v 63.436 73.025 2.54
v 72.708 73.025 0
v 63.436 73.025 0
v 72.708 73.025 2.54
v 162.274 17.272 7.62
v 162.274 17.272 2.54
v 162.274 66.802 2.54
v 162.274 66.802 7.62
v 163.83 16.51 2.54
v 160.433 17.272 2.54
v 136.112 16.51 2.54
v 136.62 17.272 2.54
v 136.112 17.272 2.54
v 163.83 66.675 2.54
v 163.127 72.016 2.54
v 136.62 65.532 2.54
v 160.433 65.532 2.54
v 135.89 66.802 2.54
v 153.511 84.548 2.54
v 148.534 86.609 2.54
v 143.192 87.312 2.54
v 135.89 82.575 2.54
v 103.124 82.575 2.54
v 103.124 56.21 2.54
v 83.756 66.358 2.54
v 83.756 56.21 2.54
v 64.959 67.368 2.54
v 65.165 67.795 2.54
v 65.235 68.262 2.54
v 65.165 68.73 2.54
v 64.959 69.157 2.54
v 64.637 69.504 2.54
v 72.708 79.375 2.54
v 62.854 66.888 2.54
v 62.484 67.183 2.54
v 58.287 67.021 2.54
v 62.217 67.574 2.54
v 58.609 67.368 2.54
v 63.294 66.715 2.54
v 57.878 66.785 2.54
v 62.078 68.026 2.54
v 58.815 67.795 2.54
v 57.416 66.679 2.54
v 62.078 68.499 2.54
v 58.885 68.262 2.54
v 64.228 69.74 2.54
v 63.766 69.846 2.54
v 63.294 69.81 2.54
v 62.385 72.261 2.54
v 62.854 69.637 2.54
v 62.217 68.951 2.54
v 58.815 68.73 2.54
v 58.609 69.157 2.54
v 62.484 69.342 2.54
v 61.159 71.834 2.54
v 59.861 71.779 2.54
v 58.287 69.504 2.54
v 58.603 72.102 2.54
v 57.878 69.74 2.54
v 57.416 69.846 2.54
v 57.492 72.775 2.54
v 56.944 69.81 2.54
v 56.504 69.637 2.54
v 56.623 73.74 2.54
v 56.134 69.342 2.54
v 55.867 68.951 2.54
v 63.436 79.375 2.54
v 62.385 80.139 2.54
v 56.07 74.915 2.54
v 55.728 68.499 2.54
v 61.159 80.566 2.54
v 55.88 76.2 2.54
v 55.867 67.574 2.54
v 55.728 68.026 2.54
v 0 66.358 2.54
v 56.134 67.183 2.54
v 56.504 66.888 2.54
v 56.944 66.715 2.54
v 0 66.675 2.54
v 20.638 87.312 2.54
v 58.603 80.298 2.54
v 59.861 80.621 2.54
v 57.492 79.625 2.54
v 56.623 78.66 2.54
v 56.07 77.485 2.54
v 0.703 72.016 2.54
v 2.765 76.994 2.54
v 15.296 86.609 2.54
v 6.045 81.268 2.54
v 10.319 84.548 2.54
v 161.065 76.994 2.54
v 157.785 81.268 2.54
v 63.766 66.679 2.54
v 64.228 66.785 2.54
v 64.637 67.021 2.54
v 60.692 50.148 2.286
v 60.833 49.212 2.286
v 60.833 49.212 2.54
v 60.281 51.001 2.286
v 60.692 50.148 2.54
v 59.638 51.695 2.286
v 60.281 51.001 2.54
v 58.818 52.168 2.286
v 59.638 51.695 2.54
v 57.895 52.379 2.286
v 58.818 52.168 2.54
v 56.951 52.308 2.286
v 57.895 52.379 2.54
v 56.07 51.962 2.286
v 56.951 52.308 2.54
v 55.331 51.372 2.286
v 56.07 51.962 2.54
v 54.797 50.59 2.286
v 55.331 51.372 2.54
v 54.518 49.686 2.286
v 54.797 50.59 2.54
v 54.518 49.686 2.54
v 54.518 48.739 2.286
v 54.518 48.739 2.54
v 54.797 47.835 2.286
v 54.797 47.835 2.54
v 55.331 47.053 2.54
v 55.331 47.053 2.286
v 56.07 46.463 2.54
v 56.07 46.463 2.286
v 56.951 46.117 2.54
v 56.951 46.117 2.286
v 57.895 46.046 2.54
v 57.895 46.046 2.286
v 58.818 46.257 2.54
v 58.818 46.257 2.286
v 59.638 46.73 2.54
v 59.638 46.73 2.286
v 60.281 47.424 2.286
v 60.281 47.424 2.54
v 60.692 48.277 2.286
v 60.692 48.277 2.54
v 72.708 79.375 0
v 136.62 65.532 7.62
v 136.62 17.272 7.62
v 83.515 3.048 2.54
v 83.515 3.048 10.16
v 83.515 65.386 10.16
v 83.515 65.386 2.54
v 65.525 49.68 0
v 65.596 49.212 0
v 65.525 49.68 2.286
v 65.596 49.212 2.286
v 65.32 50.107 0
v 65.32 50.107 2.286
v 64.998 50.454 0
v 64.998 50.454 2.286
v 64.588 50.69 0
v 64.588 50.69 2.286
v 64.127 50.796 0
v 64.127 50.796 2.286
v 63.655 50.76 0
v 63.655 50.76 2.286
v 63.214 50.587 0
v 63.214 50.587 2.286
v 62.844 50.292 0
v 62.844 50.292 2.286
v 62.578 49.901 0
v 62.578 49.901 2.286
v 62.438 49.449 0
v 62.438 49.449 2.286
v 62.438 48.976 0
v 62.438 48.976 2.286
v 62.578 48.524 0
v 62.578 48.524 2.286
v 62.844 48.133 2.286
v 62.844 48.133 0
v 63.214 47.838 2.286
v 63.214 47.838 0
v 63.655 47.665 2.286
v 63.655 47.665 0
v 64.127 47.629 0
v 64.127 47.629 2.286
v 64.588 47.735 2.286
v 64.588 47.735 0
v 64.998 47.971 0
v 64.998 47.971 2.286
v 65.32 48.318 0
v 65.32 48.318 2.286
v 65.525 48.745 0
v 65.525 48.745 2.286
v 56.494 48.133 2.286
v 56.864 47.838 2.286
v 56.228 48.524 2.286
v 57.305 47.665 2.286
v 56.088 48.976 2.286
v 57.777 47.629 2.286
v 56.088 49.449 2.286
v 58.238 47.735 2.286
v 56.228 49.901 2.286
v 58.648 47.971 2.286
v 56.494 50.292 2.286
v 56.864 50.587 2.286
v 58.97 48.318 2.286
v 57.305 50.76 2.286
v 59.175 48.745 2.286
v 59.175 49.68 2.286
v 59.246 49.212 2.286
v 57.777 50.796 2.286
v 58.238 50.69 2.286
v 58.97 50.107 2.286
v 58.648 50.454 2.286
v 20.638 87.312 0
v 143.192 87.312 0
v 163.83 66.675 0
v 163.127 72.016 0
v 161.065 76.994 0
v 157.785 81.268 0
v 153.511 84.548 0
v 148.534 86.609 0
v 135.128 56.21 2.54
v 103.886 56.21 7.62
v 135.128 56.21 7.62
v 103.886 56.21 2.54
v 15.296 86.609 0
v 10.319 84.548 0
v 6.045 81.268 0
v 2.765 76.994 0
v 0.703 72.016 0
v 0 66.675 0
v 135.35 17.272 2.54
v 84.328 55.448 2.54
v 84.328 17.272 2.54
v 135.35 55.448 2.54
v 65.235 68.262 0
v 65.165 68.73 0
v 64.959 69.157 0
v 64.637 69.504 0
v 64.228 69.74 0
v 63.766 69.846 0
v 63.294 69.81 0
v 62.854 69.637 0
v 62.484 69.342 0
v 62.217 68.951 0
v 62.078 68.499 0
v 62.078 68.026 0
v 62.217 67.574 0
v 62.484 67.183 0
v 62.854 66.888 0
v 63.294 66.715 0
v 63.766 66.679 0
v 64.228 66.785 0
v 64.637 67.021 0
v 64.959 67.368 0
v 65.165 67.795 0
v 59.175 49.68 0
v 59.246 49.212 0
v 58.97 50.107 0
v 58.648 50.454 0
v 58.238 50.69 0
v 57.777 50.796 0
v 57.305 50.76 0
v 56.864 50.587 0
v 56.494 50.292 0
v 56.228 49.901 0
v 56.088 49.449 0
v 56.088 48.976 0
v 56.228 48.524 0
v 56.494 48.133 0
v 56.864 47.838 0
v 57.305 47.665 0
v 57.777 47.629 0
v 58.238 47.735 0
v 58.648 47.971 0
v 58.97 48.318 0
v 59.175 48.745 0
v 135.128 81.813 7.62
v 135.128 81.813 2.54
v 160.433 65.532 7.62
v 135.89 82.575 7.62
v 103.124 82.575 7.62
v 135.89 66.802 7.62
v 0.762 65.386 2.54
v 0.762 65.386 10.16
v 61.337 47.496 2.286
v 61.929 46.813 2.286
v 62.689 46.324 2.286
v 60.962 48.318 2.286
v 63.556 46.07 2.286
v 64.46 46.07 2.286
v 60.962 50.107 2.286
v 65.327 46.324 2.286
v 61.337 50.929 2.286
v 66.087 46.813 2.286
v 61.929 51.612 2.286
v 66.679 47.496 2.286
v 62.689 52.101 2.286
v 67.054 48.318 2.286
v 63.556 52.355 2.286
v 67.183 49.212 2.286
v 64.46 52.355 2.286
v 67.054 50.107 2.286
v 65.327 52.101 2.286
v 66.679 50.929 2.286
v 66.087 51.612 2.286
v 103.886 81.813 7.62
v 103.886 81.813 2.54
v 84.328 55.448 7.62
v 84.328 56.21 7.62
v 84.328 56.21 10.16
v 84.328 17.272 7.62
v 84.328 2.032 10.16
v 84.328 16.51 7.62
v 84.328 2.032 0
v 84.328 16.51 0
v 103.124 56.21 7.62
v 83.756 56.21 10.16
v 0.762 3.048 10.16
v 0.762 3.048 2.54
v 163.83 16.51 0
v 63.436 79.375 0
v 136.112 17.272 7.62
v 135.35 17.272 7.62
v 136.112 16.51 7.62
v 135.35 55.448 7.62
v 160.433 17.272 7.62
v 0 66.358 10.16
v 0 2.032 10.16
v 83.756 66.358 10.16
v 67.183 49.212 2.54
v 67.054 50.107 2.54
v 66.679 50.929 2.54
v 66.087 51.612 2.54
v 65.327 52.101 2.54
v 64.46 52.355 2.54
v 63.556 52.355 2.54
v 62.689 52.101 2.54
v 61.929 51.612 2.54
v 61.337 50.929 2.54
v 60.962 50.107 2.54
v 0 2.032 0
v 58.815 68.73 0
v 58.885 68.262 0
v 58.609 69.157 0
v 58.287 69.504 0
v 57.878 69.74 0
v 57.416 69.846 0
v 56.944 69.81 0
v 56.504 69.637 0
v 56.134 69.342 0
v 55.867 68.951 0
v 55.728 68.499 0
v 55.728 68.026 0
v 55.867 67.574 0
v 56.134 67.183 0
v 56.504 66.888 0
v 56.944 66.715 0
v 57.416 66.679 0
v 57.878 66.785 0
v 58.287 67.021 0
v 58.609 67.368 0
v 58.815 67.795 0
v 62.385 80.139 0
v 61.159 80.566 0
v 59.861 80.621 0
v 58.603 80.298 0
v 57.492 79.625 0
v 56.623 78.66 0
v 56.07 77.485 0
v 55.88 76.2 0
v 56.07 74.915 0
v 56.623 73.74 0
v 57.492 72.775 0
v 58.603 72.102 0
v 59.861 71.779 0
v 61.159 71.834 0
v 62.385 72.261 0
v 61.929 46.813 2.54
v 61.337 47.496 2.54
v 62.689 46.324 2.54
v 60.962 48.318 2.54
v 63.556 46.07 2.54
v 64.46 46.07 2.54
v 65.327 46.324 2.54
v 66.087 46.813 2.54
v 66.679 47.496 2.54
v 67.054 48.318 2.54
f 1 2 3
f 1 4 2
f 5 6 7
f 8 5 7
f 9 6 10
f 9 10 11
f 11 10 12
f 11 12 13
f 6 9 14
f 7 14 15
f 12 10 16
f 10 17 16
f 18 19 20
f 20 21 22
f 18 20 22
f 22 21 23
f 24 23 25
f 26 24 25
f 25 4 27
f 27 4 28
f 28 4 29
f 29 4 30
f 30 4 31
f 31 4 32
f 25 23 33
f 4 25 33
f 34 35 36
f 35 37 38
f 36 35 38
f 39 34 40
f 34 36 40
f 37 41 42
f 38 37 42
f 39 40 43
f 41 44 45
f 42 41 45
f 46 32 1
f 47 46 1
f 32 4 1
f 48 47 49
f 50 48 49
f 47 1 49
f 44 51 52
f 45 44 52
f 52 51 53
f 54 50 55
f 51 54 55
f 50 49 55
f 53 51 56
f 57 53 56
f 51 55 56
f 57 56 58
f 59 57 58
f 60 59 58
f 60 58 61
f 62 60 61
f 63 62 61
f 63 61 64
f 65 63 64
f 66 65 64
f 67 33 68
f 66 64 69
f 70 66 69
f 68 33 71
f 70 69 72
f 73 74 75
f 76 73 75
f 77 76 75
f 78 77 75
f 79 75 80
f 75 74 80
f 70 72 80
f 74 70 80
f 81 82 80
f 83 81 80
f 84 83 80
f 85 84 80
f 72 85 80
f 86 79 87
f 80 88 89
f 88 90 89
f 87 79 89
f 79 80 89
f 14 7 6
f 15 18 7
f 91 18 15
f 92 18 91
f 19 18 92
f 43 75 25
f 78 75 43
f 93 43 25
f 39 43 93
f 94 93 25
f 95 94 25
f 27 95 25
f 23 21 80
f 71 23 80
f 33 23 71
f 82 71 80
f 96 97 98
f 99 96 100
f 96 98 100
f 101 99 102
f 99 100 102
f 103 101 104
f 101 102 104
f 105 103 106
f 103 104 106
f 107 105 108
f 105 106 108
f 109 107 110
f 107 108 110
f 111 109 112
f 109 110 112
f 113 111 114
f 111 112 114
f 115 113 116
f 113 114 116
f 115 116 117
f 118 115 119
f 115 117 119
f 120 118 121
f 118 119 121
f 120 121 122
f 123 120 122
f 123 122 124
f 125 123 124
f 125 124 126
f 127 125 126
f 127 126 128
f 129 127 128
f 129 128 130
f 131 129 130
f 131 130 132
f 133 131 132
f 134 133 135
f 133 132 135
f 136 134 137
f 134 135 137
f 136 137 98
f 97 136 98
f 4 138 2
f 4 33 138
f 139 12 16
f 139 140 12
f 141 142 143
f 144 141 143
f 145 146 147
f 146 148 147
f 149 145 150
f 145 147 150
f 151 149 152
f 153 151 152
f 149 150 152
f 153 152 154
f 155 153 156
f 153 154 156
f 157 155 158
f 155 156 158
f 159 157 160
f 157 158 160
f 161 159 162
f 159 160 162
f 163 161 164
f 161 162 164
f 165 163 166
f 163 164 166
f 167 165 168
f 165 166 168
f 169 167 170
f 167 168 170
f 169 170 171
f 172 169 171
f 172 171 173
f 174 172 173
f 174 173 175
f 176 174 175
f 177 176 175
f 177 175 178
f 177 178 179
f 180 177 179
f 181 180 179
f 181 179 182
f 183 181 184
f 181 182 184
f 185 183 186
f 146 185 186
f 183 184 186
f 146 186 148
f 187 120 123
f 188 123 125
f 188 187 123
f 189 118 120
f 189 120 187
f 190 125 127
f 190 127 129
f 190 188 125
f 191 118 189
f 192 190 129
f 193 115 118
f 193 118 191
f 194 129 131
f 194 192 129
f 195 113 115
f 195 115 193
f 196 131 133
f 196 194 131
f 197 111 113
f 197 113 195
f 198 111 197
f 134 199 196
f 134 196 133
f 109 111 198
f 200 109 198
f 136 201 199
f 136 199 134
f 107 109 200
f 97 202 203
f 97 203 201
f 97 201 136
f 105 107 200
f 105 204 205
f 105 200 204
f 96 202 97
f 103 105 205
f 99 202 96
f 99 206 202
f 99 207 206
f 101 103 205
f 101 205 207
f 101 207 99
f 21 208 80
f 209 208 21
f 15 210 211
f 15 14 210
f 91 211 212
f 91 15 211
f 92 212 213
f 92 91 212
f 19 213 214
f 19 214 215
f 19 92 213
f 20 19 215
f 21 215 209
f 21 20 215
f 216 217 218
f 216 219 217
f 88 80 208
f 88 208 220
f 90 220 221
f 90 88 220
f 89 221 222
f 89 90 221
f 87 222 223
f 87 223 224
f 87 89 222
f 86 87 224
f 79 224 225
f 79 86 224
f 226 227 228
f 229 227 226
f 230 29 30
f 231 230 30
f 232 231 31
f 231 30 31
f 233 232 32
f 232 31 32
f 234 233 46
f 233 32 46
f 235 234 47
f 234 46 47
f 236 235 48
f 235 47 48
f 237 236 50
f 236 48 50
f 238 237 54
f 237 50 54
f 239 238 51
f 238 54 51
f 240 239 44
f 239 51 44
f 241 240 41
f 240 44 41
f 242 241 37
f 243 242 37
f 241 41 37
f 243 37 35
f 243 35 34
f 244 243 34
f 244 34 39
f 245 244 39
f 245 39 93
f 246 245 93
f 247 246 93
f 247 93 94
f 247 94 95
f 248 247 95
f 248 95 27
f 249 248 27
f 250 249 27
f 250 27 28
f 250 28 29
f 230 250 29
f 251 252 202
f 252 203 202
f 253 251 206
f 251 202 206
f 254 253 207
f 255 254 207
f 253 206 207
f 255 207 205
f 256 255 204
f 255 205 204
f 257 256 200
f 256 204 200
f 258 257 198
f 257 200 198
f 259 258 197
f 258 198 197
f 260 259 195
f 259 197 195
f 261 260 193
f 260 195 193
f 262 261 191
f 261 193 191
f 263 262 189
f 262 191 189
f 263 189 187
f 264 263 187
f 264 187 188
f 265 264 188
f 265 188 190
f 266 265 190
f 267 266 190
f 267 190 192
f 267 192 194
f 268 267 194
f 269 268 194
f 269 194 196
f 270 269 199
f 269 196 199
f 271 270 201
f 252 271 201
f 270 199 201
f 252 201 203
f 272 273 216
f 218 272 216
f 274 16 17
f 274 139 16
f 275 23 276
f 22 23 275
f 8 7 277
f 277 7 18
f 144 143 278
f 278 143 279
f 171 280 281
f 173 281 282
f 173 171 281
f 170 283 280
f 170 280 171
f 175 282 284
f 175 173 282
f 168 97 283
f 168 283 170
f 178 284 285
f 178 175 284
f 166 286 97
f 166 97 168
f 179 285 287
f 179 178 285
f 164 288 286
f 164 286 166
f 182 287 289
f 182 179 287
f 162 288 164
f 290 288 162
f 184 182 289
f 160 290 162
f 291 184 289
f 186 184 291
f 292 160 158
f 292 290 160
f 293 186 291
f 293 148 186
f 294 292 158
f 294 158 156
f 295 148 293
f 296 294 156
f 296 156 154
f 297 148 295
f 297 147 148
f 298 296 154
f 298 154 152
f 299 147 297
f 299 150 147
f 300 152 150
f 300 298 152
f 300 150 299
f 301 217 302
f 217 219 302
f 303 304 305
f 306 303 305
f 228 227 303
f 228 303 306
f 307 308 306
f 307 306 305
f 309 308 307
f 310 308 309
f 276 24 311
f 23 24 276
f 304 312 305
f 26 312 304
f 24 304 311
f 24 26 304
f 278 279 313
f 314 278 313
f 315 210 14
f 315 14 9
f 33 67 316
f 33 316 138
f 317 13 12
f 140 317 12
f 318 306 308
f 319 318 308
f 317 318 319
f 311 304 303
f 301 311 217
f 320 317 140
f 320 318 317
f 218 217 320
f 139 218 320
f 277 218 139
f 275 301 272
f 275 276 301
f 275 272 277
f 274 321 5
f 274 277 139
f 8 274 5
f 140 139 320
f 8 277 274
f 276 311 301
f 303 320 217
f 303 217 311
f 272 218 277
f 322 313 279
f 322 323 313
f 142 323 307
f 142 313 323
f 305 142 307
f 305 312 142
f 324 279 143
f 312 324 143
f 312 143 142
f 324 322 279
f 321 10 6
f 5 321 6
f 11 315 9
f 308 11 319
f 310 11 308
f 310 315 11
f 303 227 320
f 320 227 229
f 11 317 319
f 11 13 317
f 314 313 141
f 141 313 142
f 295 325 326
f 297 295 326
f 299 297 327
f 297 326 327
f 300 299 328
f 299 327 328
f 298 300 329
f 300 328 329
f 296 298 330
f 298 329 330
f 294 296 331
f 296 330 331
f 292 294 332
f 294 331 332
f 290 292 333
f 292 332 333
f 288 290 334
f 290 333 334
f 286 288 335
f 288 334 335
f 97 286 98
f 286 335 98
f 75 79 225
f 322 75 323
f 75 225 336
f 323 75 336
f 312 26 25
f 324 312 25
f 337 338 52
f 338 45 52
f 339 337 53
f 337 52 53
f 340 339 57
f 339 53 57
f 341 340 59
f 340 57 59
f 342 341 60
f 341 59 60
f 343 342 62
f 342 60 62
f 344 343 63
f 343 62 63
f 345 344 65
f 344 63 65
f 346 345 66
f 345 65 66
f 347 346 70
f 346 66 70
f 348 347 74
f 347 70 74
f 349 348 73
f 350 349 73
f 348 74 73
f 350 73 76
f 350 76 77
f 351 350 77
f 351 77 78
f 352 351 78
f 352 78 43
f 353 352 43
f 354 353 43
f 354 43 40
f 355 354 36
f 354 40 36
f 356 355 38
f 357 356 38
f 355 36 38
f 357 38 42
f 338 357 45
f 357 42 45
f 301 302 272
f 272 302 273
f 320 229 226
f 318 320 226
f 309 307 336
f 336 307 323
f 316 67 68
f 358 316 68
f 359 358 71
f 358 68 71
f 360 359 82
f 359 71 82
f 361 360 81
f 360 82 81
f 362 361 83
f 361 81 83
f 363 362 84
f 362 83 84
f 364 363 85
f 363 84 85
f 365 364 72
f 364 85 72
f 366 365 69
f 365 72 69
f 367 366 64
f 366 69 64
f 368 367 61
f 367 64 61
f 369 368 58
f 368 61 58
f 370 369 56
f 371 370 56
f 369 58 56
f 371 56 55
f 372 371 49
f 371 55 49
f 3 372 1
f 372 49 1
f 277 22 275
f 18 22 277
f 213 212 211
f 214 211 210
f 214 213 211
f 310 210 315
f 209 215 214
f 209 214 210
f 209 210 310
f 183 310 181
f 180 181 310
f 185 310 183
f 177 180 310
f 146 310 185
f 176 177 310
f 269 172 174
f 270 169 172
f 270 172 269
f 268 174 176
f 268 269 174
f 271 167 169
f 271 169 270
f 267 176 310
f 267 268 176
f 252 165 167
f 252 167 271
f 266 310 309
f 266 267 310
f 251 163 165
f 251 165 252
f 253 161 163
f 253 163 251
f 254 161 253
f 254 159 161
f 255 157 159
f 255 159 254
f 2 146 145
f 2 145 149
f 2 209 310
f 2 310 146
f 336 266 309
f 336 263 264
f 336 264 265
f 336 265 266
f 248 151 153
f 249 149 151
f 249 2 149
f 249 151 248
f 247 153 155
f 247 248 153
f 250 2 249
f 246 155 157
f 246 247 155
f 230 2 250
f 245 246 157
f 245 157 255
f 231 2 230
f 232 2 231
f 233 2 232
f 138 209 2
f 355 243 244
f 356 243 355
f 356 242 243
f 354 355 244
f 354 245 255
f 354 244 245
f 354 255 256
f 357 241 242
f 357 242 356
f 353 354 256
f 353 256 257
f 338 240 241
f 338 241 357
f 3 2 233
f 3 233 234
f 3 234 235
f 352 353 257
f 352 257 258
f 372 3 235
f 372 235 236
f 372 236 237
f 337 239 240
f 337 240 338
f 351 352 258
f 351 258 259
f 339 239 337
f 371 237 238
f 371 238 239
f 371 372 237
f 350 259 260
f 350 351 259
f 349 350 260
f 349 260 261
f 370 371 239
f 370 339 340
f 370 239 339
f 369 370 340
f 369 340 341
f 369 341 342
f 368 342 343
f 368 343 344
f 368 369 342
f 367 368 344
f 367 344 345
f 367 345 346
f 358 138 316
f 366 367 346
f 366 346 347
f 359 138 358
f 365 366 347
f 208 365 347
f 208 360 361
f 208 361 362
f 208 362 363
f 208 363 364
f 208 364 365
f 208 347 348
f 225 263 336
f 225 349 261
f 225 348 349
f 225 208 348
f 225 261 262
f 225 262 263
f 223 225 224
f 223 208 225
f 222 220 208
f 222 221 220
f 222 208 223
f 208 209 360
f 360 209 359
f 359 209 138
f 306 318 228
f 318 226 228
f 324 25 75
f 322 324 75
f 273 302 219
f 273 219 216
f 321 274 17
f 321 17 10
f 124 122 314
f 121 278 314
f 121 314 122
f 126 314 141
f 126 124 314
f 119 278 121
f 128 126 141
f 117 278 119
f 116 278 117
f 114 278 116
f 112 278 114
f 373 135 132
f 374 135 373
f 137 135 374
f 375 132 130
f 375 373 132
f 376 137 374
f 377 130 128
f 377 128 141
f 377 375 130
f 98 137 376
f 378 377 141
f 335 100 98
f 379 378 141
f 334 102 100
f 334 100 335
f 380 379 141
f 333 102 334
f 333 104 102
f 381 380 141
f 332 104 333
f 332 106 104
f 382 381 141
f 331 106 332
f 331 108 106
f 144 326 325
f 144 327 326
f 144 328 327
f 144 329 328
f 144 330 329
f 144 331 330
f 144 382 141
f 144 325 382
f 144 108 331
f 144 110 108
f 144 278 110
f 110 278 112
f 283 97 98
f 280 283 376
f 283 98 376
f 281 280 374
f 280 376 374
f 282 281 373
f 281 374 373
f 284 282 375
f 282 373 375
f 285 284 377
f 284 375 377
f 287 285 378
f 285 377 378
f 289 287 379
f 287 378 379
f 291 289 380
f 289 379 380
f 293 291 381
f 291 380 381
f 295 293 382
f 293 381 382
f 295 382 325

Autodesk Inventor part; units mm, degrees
sketch "Sketch1" plane through (0, 0, 0) normal (0, 0, 1) x (1, 0, 0)
  line L0 (0, 87.3125) -> (163.83, 87.3125)
  line L1 (163.83, 87.3125) -> (163.83, 0)
  line L2 (163.83, 0) -> (0, 0)
  line L3 (0, 0) -> (0, 87.3125)
  dimension "d0" = 163.83
  dimension "d1" = 87.3125
extrude "Extrusion1" add sketch "Sketch1" along normal blind 2.54
sketch "Sketch2" plane through (0, 0, 2.54) normal (0, 0, 1) x (1, 0, 0)
  point P0 (0, 0)
fillet "Fillet1" radius 20.6375 1 edges at (163.83, 87.3125, 1.27)
fillet "Fillet2" radius 20.6375 1 edges at (0, 87.3125, 1.27)
sketch "Sketch8" plane through (0, 0, 2.54) normal (0, 0, 1) x (1, 0, 0)
  point P0 (0, 0)
sketch "Sketch11" plane through (0, 0, 2.54) normal (0, 0, 1) x (1, 0, 0)
  point P0 (0, 0)
sketch "Sketch15" plane through (0, 0, 2.54) normal (0, 0, 1) x (1, 0, 0)
  line L0 (83.566, 56.2102) -> (136.1122, 56.2102)
  line L1 (136.1122, 56.2102) -> (136.1122, 16.51)
  line L2 (136.1122, 16.51) -> (83.566, 16.51)
  line L3 (83.566, 16.51) -> (83.566, 56.2102)
  line L4 (0, 0) -> (163.83, 0) projected
  line L5 (163.83, 0) -> (163.83, 66.675) projected
  dimension "d136" = 52.5463
  dimension "d137" = 16.51
  dimension "d151" = 39.7002
  dimension "d184" = 27.7177
extrude "Extrusion6" add sketch "Sketch15" along normal blind 5.08
shell "Shell5" thickness 0.762 removed faces 1 at (101.0814, 42.9768, 7.62)
sketch "Sketch16" plane through (0, 0, 2.54) normal (0, 0, 1) x (1, 0, 0)
  line L0 (103.124, 82.5754) -> (135.89, 82.5754)
  line L1 (135.89, 82.5754) -> (135.89, 56.2102)
  line L2 (135.89, 56.2102) -> (103.124, 56.2102)
  line L3 (103.124, 56.2102) -> (103.124, 82.5754)
  arc A0 (163.83, 66.675) -> (143.1925, 87.3125) centre (143.1925, 66.675) ccw projected
  line L4 (136.1122, 56.2102) -> (83.566, 56.2102) projected
  point P0 (0, 0)
  dimension "d62" = 32.766
  dimension "d63" = 26.3652
  dimension "d183" = 27.94
  dimension "d231" = 0
extrude "Extrusion7" add sketch "Sketch16" along normal blind 5.08
shell "Shell6" thickness 0.762 removed faces 1 at (124.968, 73.787, 7.62)
sketch "Sketch20" plane through (0, 0, 2.54) normal (0, 0, 1) x (1, 0, 0)
  circle A0 centre (60.325, 76.2) radius 4.445
  line L0 (0, 66.675) -> (0, 0) projected
  line L1 (103.124, 87.3125) -> (20.6375, 87.3125) projected
  point P0 (103.124, 82.5754)
  point P1 (20.6375, 87.3125)
  dimension "d77" = 8.89
  dimension "d138" = 60.325
  dimension "d150" = 11.1125
sketch "Sketch24" plane through (0, 0, 2.54) normal (0, 0, 1) x (1, 0, 0)
  line L0 (0, 0) -> (83.7565, 0)
  line L1 (83.7565, 0) -> (83.7565, 66.3575)
  line L2 (83.7565, 66.3575) -> (0, 66.3575)
  line L3 (0, 66.3575) -> (0, 0)
  line L4 (103.124, 87.3125) -> (20.6375, 87.3125) projected
  point P0 (103.124, 82.5754)
  point P1 (20.6375, 87.3125)
  dimension "d114" = 83.7565
  dimension "d210" = 20.955
extrude "Extrusion13" add sketch "Sketch24" along normal blind 7.62
sketch "Sketch25" plane through (0, 0, 2.54) normal (0, 0, 1) x (1, 0, 0)
  circle A0 centre (57.2977, 68.2625) radius 1.5875
  line L0 (0, 66.675) -> (0, 66.3575) projected
  circle A1 centre (63.6477, 68.2625) radius 1.5875
  line L1 (103.124, 87.3125) -> (20.6375, 87.3125) projected
  point P0 (0, 0)
  point P1 (103.124, 82.5754)
  point P2 (20.6375, 87.3125)
  dimension "d126" = 3.175
  dimension "d139" = 57.2977
  dimension "d141" = 6.35
  dimension "d149" = 19.05
sketch "Sketch27" plane through (0, 0, 2.54) normal (0, 0, 1) x (1, 0, 0)
  line L0 (62.5475, 79.375) -> (72.7075, 79.375)
  line L1 (72.7075, 79.375) -> (72.7075, 73.025)
  line L2 (72.7075, 73.025) -> (62.5475, 73.025)
  line L3 (62.5475, 73.025) -> (62.5475, 79.375)
  arc A0 (20.6375, 87.3125) -> (0, 66.675) centre (20.6375, 66.675) ccw projected
  point P0 (0, 0)
  dimension "d181" = 41.91
  dimension "d182" = 10.16
ref_plane "Work Plane1" through (0.508, 0.508, 2.286) normal (0, 0, 1) x (1, 0, 0)
sketch "Sketch28" plane through (0.508, 0.508, 2.286) normal (0, 0, 1) x (1, 0, 0)
  circle A0 centre (57.15, 48.7045) radius 1.5875
  circle A1 centre (56.7897, 67.7545) radius 1.5875 projected
  circle A2 centre (63.5, 48.7045) radius 1.5875
  circle A3 centre (62.992, 67.7545) radius 1.5875 projected
  point P0 (-0.508, -0.508)
  dimension "d154" = 19.05
  dimension "d155" = 3.175
  dimension "d156" = 19.05
  dimension "d157" = 6.35
ref_plane "Work Plane2" through (0.508, 0.508, 2.286) normal (0, 0, 1) x (1, 0, 0)
sketch "Sketch29" plane through (0.508, 0.508, 2.286) normal (0, 0, 1) x (1, 0, 0)
  line L0 (82.7405, 64.7065) -> (0, 64.7065) projected
  line L1 (82.7405, 0) -> (0, 0) projected
  line L2 (0, 64.7065) -> (82.7405, 64.7065)
  line L3 (82.7405, 64.7065) -> (82.7405, 0)
  line L4 (82.7405, 0) -> (0, 0)
  line L5 (0, 0) -> (0, 64.7065)
  point P0 (-0.508, -0.508)
  point P1 (84.836, 62.484)
extrude "Extrusion16" add sketch "Sketch29" along normal blind 2.54
ref_plane "Work Plane3" through (0.508, 0.508, 4.826) normal (0, 0, 1) x (1, 0, 0)
sketch "Sketch30" plane through (0.508, 0.508, 4.826) normal (0, 0, 1) x (1, 0, 0)
  circle A0 centre (57.15, 48.7045) radius 3.175
  circle A1 centre (63.5, 48.7045) radius 3.175
  circle A2 centre (56.7897, 67.7545) radius 1.5875 projected
  circle A3 centre (62.992, 67.7545) radius 1.5875 projected
  point P0 (-0.508, -0.508)
  dimension "d162" = 6.35
  dimension "d163" = 19.05
  dimension "d164" = 19.05
sketch "Sketch33" plane through (20.6375, 86.5505, 0.762) normal (0, 0, 1) x (1, 0, 0)
  line L0 (63.6905, -69.2785) -> (63.6905, -31.1023) projected
  line L1 (114.7127, -69.2785) -> (63.6905, -69.2785) projected
  line L2 (63.6905, -31.1023) -> (114.7127, -31.1023)
  line L3 (114.7127, -31.1023) -> (114.7127, -69.2785)
  line L4 (114.7127, -69.2785) -> (63.6905, -69.2785)
  line L5 (63.6905, -69.2785) -> (63.6905, -31.1023)
  point P0 (-20.6375, -86.5505)
extrude "Extrusion20" add sketch "Sketch33" along normal blind 1.778
sketch "Sketch34" plane through (0, 0, 0) normal (0, 0, -1) x (-1, 0, 0)
  line L0 (-163.83, 0) -> (0, 0)
  line L1 (0, 0) -> (0, 87.3125)
  line L2 (0, 87.3125) -> (-163.83, 87.3125)
  line L3 (-163.83, 87.3125) -> (-163.83, 0)
  point P0 (0, 0)
extrude "Extrusion21" add sketch "Sketch34" against normal blind 2.54
extrude "Extrusion22" cut sketch "Sketch20" against normal blind 7.62
extrude "Extrusion23" cut sketch "Sketch25" against normal blind 7.62
extrude "Extrusion24" cut sketch "Sketch28" along normal mid plane 7.62 contours A0 | A2
extrude "Extrusion25" cut sketch "Sketch27" against normal blind 7.62
fillet "Fillet4" radius 20.6375 1 edges at (163.83, 87.3125, 1.27)
fillet "Fillet5" radius 20.6375 1 edges at (0, 87.3125, 1.27)
sketch "Sketch35" plane through (0, 0, 2.54) normal (0, 0, 1) x (1, 0, 0)
  line L0 (135.3502, 17.272) -> (84.328, 17.272) projected
  line L1 (135.3502, 17.272) -> (162.2742, 17.272)
  line L2 (162.2742, 17.272) -> (162.2742, 66.802)
  line L3 (162.2742, 66.802) -> (135.3502, 66.802)
  line L4 (135.3502, 66.802) -> (135.3502, 17.272)
  point P0 (0, 0)
  point P1 (85.344, 22.352)
  dimension "d199" = 26.924
  dimension "d200" = 49.53
extrude "Extrusion26" add sketch "Sketch35" along normal blind 5.08
sketch "Sketch36" plane through (0, 0, 7.62) normal (0, 0, 1) x (1, 0, 0)
  line L0 (136.6202, 65.532) -> (160.4327, 65.532)
  line L1 (160.4327, 65.532) -> (160.4327, 14.732)
  line L2 (160.4327, 14.732) -> (136.6202, 14.732)
  line L3 (136.6202, 14.732) -> (136.6202, 65.532)
  line L4 (135.3502, 55.4482) -> (135.3502, 17.272) projected
  line L5 (162.2742, 66.802) -> (135.89, 66.802) projected
  line L6 (136.1122, 17.272) -> (162.2742, 17.272) projected
  point P0 (0, 0)
  point P1 (135.3502, 66.802)
  dimension "d203" = 23.8125
  dimension "d204" = 1.27
  dimension "d205" = 1.27
  dimension "d207" = 50.8
extrude "Extrusion27" cut sketch "Sketch36" against normal blind 5.08
sketch "Sketch37" plane through (0, 0, 10.16) normal (0, 0, 1) x (1, 0, 0)
  line L0 (0.762, 3.048) -> (83.5152, 3.048)
  line L1 (83.5152, 3.048) -> (83.5152, 65.3859)
  line L2 (83.5152, 65.3859) -> (0.762, 65.386)
  line L3 (0.762, 65.386) -> (0.762, 3.048)
  line L4 (0, 66.3575) -> (0, 0) projected
  line L5 (0, 0) -> (83.7565, 0) projected
  dimension "d211" = 82.7532
  dimension "d212" = 62.3379
  dimension "d213" = 0.762
  dimension "d214" = 3.048
extrude "Extrusion28" cut sketch "Sketch37" against normal blind 7.62
extrude "Extrusion29" cut sketch "Sketch30" against normal blind 2.54 contours A0 | A1
sketch "Sketch38" plane through (0, 0, 2.54) normal (0, 0, 1) x (1, 0, 0)
  line L0 (163.83, 0) -> (0, 0) projected
  line L1 (163.83, 0) -> (84.1375, 0)
  line L2 (84.1375, 0) -> (84.1375, 16.51)
  line L3 (84.1375, 16.51) -> (163.83, 16.51)
  line L4 (163.83, 16.51) -> (163.83, 0)
  dimension "d229" = 16.51
extrude "Extrusion30" cut sketch "Sketch38" against normal blind 12.7
sketch "Sketch39" plane through (0, 0, 7.62) normal (0, 0, 1) x (1, 0, 0)
  line L0 (83.7565, 66.3575) -> (83.7565, 56.2102) projected
  line L1 (83.7565, 56.2102) -> (84.328, 56.2102)
  line L2 (84.328, 56.2102) -> (84.328, 0)
  line L3 (84.328, 0) -> (83.7565, 0)
  line L4 (83.7565, 0) -> (83.7565, 56.2102)
  line L5 (84.328, 17.272) -> (84.328, 55.4482) projected
  line L6 (83.7565, 0) -> (84.1375, 0) projected
  point P0 (0, 0)
  dimension "d221" = 0
  dimension "d230" = 0
extrude "Extrusion31" add sketch "Sketch39" along normal blind 2.54 and the other way blind 7.62
sketch "Sketch40" plane through (0, 0, 10.16) normal (0, 0, 1) x (1, 0, 0)
  line L0 (84.328, 0) -> (84.328, 56.2102) projected
  line L1 (0, 0) -> (84.328, 0)
  line L2 (84.328, 0) -> (84.328, 2.032)
  line L3 (84.328, 2.032) -> (0, 2.032)
  line L4 (0, 2.032) -> (0, 0)
  line L5 (83.5152, 3.048) -> (0.762, 3.048) projected
  dimension "d226" = 1.016
extrude "Extrusion32" cut sketch "Sketch40" against normal blind 12.7
properties part number "Base Plate 2"
